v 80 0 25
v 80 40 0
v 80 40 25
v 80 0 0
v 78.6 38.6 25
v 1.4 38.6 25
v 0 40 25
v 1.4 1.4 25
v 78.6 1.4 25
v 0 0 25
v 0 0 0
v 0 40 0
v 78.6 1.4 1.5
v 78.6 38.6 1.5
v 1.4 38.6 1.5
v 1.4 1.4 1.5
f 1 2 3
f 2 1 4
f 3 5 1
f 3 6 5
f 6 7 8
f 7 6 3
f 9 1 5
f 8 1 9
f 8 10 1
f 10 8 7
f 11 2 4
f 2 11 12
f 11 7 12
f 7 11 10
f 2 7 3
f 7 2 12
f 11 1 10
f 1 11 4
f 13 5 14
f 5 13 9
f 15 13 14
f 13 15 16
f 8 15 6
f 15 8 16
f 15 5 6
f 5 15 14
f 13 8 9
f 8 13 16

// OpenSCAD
$fn = 32;

// ----------------------------------------------------------------------
// Open box: 1.4 mm walls
// ----------------------------------------------------------------------

// --- parameters (mm) ---
box_l = 80;               // outer length, X
box_w = 40;               // outer width, Y
box_h = 25;               // outer height, Z
wall = 1.4;               // wall thickness
floor = 1.5;              // floor thickness

difference() {
  cube([box_l, box_w, box_h]);
  translate([wall, wall, floor])
    cube([box_l - 2 * wall, box_w - 2 * wall, box_h]);
}
